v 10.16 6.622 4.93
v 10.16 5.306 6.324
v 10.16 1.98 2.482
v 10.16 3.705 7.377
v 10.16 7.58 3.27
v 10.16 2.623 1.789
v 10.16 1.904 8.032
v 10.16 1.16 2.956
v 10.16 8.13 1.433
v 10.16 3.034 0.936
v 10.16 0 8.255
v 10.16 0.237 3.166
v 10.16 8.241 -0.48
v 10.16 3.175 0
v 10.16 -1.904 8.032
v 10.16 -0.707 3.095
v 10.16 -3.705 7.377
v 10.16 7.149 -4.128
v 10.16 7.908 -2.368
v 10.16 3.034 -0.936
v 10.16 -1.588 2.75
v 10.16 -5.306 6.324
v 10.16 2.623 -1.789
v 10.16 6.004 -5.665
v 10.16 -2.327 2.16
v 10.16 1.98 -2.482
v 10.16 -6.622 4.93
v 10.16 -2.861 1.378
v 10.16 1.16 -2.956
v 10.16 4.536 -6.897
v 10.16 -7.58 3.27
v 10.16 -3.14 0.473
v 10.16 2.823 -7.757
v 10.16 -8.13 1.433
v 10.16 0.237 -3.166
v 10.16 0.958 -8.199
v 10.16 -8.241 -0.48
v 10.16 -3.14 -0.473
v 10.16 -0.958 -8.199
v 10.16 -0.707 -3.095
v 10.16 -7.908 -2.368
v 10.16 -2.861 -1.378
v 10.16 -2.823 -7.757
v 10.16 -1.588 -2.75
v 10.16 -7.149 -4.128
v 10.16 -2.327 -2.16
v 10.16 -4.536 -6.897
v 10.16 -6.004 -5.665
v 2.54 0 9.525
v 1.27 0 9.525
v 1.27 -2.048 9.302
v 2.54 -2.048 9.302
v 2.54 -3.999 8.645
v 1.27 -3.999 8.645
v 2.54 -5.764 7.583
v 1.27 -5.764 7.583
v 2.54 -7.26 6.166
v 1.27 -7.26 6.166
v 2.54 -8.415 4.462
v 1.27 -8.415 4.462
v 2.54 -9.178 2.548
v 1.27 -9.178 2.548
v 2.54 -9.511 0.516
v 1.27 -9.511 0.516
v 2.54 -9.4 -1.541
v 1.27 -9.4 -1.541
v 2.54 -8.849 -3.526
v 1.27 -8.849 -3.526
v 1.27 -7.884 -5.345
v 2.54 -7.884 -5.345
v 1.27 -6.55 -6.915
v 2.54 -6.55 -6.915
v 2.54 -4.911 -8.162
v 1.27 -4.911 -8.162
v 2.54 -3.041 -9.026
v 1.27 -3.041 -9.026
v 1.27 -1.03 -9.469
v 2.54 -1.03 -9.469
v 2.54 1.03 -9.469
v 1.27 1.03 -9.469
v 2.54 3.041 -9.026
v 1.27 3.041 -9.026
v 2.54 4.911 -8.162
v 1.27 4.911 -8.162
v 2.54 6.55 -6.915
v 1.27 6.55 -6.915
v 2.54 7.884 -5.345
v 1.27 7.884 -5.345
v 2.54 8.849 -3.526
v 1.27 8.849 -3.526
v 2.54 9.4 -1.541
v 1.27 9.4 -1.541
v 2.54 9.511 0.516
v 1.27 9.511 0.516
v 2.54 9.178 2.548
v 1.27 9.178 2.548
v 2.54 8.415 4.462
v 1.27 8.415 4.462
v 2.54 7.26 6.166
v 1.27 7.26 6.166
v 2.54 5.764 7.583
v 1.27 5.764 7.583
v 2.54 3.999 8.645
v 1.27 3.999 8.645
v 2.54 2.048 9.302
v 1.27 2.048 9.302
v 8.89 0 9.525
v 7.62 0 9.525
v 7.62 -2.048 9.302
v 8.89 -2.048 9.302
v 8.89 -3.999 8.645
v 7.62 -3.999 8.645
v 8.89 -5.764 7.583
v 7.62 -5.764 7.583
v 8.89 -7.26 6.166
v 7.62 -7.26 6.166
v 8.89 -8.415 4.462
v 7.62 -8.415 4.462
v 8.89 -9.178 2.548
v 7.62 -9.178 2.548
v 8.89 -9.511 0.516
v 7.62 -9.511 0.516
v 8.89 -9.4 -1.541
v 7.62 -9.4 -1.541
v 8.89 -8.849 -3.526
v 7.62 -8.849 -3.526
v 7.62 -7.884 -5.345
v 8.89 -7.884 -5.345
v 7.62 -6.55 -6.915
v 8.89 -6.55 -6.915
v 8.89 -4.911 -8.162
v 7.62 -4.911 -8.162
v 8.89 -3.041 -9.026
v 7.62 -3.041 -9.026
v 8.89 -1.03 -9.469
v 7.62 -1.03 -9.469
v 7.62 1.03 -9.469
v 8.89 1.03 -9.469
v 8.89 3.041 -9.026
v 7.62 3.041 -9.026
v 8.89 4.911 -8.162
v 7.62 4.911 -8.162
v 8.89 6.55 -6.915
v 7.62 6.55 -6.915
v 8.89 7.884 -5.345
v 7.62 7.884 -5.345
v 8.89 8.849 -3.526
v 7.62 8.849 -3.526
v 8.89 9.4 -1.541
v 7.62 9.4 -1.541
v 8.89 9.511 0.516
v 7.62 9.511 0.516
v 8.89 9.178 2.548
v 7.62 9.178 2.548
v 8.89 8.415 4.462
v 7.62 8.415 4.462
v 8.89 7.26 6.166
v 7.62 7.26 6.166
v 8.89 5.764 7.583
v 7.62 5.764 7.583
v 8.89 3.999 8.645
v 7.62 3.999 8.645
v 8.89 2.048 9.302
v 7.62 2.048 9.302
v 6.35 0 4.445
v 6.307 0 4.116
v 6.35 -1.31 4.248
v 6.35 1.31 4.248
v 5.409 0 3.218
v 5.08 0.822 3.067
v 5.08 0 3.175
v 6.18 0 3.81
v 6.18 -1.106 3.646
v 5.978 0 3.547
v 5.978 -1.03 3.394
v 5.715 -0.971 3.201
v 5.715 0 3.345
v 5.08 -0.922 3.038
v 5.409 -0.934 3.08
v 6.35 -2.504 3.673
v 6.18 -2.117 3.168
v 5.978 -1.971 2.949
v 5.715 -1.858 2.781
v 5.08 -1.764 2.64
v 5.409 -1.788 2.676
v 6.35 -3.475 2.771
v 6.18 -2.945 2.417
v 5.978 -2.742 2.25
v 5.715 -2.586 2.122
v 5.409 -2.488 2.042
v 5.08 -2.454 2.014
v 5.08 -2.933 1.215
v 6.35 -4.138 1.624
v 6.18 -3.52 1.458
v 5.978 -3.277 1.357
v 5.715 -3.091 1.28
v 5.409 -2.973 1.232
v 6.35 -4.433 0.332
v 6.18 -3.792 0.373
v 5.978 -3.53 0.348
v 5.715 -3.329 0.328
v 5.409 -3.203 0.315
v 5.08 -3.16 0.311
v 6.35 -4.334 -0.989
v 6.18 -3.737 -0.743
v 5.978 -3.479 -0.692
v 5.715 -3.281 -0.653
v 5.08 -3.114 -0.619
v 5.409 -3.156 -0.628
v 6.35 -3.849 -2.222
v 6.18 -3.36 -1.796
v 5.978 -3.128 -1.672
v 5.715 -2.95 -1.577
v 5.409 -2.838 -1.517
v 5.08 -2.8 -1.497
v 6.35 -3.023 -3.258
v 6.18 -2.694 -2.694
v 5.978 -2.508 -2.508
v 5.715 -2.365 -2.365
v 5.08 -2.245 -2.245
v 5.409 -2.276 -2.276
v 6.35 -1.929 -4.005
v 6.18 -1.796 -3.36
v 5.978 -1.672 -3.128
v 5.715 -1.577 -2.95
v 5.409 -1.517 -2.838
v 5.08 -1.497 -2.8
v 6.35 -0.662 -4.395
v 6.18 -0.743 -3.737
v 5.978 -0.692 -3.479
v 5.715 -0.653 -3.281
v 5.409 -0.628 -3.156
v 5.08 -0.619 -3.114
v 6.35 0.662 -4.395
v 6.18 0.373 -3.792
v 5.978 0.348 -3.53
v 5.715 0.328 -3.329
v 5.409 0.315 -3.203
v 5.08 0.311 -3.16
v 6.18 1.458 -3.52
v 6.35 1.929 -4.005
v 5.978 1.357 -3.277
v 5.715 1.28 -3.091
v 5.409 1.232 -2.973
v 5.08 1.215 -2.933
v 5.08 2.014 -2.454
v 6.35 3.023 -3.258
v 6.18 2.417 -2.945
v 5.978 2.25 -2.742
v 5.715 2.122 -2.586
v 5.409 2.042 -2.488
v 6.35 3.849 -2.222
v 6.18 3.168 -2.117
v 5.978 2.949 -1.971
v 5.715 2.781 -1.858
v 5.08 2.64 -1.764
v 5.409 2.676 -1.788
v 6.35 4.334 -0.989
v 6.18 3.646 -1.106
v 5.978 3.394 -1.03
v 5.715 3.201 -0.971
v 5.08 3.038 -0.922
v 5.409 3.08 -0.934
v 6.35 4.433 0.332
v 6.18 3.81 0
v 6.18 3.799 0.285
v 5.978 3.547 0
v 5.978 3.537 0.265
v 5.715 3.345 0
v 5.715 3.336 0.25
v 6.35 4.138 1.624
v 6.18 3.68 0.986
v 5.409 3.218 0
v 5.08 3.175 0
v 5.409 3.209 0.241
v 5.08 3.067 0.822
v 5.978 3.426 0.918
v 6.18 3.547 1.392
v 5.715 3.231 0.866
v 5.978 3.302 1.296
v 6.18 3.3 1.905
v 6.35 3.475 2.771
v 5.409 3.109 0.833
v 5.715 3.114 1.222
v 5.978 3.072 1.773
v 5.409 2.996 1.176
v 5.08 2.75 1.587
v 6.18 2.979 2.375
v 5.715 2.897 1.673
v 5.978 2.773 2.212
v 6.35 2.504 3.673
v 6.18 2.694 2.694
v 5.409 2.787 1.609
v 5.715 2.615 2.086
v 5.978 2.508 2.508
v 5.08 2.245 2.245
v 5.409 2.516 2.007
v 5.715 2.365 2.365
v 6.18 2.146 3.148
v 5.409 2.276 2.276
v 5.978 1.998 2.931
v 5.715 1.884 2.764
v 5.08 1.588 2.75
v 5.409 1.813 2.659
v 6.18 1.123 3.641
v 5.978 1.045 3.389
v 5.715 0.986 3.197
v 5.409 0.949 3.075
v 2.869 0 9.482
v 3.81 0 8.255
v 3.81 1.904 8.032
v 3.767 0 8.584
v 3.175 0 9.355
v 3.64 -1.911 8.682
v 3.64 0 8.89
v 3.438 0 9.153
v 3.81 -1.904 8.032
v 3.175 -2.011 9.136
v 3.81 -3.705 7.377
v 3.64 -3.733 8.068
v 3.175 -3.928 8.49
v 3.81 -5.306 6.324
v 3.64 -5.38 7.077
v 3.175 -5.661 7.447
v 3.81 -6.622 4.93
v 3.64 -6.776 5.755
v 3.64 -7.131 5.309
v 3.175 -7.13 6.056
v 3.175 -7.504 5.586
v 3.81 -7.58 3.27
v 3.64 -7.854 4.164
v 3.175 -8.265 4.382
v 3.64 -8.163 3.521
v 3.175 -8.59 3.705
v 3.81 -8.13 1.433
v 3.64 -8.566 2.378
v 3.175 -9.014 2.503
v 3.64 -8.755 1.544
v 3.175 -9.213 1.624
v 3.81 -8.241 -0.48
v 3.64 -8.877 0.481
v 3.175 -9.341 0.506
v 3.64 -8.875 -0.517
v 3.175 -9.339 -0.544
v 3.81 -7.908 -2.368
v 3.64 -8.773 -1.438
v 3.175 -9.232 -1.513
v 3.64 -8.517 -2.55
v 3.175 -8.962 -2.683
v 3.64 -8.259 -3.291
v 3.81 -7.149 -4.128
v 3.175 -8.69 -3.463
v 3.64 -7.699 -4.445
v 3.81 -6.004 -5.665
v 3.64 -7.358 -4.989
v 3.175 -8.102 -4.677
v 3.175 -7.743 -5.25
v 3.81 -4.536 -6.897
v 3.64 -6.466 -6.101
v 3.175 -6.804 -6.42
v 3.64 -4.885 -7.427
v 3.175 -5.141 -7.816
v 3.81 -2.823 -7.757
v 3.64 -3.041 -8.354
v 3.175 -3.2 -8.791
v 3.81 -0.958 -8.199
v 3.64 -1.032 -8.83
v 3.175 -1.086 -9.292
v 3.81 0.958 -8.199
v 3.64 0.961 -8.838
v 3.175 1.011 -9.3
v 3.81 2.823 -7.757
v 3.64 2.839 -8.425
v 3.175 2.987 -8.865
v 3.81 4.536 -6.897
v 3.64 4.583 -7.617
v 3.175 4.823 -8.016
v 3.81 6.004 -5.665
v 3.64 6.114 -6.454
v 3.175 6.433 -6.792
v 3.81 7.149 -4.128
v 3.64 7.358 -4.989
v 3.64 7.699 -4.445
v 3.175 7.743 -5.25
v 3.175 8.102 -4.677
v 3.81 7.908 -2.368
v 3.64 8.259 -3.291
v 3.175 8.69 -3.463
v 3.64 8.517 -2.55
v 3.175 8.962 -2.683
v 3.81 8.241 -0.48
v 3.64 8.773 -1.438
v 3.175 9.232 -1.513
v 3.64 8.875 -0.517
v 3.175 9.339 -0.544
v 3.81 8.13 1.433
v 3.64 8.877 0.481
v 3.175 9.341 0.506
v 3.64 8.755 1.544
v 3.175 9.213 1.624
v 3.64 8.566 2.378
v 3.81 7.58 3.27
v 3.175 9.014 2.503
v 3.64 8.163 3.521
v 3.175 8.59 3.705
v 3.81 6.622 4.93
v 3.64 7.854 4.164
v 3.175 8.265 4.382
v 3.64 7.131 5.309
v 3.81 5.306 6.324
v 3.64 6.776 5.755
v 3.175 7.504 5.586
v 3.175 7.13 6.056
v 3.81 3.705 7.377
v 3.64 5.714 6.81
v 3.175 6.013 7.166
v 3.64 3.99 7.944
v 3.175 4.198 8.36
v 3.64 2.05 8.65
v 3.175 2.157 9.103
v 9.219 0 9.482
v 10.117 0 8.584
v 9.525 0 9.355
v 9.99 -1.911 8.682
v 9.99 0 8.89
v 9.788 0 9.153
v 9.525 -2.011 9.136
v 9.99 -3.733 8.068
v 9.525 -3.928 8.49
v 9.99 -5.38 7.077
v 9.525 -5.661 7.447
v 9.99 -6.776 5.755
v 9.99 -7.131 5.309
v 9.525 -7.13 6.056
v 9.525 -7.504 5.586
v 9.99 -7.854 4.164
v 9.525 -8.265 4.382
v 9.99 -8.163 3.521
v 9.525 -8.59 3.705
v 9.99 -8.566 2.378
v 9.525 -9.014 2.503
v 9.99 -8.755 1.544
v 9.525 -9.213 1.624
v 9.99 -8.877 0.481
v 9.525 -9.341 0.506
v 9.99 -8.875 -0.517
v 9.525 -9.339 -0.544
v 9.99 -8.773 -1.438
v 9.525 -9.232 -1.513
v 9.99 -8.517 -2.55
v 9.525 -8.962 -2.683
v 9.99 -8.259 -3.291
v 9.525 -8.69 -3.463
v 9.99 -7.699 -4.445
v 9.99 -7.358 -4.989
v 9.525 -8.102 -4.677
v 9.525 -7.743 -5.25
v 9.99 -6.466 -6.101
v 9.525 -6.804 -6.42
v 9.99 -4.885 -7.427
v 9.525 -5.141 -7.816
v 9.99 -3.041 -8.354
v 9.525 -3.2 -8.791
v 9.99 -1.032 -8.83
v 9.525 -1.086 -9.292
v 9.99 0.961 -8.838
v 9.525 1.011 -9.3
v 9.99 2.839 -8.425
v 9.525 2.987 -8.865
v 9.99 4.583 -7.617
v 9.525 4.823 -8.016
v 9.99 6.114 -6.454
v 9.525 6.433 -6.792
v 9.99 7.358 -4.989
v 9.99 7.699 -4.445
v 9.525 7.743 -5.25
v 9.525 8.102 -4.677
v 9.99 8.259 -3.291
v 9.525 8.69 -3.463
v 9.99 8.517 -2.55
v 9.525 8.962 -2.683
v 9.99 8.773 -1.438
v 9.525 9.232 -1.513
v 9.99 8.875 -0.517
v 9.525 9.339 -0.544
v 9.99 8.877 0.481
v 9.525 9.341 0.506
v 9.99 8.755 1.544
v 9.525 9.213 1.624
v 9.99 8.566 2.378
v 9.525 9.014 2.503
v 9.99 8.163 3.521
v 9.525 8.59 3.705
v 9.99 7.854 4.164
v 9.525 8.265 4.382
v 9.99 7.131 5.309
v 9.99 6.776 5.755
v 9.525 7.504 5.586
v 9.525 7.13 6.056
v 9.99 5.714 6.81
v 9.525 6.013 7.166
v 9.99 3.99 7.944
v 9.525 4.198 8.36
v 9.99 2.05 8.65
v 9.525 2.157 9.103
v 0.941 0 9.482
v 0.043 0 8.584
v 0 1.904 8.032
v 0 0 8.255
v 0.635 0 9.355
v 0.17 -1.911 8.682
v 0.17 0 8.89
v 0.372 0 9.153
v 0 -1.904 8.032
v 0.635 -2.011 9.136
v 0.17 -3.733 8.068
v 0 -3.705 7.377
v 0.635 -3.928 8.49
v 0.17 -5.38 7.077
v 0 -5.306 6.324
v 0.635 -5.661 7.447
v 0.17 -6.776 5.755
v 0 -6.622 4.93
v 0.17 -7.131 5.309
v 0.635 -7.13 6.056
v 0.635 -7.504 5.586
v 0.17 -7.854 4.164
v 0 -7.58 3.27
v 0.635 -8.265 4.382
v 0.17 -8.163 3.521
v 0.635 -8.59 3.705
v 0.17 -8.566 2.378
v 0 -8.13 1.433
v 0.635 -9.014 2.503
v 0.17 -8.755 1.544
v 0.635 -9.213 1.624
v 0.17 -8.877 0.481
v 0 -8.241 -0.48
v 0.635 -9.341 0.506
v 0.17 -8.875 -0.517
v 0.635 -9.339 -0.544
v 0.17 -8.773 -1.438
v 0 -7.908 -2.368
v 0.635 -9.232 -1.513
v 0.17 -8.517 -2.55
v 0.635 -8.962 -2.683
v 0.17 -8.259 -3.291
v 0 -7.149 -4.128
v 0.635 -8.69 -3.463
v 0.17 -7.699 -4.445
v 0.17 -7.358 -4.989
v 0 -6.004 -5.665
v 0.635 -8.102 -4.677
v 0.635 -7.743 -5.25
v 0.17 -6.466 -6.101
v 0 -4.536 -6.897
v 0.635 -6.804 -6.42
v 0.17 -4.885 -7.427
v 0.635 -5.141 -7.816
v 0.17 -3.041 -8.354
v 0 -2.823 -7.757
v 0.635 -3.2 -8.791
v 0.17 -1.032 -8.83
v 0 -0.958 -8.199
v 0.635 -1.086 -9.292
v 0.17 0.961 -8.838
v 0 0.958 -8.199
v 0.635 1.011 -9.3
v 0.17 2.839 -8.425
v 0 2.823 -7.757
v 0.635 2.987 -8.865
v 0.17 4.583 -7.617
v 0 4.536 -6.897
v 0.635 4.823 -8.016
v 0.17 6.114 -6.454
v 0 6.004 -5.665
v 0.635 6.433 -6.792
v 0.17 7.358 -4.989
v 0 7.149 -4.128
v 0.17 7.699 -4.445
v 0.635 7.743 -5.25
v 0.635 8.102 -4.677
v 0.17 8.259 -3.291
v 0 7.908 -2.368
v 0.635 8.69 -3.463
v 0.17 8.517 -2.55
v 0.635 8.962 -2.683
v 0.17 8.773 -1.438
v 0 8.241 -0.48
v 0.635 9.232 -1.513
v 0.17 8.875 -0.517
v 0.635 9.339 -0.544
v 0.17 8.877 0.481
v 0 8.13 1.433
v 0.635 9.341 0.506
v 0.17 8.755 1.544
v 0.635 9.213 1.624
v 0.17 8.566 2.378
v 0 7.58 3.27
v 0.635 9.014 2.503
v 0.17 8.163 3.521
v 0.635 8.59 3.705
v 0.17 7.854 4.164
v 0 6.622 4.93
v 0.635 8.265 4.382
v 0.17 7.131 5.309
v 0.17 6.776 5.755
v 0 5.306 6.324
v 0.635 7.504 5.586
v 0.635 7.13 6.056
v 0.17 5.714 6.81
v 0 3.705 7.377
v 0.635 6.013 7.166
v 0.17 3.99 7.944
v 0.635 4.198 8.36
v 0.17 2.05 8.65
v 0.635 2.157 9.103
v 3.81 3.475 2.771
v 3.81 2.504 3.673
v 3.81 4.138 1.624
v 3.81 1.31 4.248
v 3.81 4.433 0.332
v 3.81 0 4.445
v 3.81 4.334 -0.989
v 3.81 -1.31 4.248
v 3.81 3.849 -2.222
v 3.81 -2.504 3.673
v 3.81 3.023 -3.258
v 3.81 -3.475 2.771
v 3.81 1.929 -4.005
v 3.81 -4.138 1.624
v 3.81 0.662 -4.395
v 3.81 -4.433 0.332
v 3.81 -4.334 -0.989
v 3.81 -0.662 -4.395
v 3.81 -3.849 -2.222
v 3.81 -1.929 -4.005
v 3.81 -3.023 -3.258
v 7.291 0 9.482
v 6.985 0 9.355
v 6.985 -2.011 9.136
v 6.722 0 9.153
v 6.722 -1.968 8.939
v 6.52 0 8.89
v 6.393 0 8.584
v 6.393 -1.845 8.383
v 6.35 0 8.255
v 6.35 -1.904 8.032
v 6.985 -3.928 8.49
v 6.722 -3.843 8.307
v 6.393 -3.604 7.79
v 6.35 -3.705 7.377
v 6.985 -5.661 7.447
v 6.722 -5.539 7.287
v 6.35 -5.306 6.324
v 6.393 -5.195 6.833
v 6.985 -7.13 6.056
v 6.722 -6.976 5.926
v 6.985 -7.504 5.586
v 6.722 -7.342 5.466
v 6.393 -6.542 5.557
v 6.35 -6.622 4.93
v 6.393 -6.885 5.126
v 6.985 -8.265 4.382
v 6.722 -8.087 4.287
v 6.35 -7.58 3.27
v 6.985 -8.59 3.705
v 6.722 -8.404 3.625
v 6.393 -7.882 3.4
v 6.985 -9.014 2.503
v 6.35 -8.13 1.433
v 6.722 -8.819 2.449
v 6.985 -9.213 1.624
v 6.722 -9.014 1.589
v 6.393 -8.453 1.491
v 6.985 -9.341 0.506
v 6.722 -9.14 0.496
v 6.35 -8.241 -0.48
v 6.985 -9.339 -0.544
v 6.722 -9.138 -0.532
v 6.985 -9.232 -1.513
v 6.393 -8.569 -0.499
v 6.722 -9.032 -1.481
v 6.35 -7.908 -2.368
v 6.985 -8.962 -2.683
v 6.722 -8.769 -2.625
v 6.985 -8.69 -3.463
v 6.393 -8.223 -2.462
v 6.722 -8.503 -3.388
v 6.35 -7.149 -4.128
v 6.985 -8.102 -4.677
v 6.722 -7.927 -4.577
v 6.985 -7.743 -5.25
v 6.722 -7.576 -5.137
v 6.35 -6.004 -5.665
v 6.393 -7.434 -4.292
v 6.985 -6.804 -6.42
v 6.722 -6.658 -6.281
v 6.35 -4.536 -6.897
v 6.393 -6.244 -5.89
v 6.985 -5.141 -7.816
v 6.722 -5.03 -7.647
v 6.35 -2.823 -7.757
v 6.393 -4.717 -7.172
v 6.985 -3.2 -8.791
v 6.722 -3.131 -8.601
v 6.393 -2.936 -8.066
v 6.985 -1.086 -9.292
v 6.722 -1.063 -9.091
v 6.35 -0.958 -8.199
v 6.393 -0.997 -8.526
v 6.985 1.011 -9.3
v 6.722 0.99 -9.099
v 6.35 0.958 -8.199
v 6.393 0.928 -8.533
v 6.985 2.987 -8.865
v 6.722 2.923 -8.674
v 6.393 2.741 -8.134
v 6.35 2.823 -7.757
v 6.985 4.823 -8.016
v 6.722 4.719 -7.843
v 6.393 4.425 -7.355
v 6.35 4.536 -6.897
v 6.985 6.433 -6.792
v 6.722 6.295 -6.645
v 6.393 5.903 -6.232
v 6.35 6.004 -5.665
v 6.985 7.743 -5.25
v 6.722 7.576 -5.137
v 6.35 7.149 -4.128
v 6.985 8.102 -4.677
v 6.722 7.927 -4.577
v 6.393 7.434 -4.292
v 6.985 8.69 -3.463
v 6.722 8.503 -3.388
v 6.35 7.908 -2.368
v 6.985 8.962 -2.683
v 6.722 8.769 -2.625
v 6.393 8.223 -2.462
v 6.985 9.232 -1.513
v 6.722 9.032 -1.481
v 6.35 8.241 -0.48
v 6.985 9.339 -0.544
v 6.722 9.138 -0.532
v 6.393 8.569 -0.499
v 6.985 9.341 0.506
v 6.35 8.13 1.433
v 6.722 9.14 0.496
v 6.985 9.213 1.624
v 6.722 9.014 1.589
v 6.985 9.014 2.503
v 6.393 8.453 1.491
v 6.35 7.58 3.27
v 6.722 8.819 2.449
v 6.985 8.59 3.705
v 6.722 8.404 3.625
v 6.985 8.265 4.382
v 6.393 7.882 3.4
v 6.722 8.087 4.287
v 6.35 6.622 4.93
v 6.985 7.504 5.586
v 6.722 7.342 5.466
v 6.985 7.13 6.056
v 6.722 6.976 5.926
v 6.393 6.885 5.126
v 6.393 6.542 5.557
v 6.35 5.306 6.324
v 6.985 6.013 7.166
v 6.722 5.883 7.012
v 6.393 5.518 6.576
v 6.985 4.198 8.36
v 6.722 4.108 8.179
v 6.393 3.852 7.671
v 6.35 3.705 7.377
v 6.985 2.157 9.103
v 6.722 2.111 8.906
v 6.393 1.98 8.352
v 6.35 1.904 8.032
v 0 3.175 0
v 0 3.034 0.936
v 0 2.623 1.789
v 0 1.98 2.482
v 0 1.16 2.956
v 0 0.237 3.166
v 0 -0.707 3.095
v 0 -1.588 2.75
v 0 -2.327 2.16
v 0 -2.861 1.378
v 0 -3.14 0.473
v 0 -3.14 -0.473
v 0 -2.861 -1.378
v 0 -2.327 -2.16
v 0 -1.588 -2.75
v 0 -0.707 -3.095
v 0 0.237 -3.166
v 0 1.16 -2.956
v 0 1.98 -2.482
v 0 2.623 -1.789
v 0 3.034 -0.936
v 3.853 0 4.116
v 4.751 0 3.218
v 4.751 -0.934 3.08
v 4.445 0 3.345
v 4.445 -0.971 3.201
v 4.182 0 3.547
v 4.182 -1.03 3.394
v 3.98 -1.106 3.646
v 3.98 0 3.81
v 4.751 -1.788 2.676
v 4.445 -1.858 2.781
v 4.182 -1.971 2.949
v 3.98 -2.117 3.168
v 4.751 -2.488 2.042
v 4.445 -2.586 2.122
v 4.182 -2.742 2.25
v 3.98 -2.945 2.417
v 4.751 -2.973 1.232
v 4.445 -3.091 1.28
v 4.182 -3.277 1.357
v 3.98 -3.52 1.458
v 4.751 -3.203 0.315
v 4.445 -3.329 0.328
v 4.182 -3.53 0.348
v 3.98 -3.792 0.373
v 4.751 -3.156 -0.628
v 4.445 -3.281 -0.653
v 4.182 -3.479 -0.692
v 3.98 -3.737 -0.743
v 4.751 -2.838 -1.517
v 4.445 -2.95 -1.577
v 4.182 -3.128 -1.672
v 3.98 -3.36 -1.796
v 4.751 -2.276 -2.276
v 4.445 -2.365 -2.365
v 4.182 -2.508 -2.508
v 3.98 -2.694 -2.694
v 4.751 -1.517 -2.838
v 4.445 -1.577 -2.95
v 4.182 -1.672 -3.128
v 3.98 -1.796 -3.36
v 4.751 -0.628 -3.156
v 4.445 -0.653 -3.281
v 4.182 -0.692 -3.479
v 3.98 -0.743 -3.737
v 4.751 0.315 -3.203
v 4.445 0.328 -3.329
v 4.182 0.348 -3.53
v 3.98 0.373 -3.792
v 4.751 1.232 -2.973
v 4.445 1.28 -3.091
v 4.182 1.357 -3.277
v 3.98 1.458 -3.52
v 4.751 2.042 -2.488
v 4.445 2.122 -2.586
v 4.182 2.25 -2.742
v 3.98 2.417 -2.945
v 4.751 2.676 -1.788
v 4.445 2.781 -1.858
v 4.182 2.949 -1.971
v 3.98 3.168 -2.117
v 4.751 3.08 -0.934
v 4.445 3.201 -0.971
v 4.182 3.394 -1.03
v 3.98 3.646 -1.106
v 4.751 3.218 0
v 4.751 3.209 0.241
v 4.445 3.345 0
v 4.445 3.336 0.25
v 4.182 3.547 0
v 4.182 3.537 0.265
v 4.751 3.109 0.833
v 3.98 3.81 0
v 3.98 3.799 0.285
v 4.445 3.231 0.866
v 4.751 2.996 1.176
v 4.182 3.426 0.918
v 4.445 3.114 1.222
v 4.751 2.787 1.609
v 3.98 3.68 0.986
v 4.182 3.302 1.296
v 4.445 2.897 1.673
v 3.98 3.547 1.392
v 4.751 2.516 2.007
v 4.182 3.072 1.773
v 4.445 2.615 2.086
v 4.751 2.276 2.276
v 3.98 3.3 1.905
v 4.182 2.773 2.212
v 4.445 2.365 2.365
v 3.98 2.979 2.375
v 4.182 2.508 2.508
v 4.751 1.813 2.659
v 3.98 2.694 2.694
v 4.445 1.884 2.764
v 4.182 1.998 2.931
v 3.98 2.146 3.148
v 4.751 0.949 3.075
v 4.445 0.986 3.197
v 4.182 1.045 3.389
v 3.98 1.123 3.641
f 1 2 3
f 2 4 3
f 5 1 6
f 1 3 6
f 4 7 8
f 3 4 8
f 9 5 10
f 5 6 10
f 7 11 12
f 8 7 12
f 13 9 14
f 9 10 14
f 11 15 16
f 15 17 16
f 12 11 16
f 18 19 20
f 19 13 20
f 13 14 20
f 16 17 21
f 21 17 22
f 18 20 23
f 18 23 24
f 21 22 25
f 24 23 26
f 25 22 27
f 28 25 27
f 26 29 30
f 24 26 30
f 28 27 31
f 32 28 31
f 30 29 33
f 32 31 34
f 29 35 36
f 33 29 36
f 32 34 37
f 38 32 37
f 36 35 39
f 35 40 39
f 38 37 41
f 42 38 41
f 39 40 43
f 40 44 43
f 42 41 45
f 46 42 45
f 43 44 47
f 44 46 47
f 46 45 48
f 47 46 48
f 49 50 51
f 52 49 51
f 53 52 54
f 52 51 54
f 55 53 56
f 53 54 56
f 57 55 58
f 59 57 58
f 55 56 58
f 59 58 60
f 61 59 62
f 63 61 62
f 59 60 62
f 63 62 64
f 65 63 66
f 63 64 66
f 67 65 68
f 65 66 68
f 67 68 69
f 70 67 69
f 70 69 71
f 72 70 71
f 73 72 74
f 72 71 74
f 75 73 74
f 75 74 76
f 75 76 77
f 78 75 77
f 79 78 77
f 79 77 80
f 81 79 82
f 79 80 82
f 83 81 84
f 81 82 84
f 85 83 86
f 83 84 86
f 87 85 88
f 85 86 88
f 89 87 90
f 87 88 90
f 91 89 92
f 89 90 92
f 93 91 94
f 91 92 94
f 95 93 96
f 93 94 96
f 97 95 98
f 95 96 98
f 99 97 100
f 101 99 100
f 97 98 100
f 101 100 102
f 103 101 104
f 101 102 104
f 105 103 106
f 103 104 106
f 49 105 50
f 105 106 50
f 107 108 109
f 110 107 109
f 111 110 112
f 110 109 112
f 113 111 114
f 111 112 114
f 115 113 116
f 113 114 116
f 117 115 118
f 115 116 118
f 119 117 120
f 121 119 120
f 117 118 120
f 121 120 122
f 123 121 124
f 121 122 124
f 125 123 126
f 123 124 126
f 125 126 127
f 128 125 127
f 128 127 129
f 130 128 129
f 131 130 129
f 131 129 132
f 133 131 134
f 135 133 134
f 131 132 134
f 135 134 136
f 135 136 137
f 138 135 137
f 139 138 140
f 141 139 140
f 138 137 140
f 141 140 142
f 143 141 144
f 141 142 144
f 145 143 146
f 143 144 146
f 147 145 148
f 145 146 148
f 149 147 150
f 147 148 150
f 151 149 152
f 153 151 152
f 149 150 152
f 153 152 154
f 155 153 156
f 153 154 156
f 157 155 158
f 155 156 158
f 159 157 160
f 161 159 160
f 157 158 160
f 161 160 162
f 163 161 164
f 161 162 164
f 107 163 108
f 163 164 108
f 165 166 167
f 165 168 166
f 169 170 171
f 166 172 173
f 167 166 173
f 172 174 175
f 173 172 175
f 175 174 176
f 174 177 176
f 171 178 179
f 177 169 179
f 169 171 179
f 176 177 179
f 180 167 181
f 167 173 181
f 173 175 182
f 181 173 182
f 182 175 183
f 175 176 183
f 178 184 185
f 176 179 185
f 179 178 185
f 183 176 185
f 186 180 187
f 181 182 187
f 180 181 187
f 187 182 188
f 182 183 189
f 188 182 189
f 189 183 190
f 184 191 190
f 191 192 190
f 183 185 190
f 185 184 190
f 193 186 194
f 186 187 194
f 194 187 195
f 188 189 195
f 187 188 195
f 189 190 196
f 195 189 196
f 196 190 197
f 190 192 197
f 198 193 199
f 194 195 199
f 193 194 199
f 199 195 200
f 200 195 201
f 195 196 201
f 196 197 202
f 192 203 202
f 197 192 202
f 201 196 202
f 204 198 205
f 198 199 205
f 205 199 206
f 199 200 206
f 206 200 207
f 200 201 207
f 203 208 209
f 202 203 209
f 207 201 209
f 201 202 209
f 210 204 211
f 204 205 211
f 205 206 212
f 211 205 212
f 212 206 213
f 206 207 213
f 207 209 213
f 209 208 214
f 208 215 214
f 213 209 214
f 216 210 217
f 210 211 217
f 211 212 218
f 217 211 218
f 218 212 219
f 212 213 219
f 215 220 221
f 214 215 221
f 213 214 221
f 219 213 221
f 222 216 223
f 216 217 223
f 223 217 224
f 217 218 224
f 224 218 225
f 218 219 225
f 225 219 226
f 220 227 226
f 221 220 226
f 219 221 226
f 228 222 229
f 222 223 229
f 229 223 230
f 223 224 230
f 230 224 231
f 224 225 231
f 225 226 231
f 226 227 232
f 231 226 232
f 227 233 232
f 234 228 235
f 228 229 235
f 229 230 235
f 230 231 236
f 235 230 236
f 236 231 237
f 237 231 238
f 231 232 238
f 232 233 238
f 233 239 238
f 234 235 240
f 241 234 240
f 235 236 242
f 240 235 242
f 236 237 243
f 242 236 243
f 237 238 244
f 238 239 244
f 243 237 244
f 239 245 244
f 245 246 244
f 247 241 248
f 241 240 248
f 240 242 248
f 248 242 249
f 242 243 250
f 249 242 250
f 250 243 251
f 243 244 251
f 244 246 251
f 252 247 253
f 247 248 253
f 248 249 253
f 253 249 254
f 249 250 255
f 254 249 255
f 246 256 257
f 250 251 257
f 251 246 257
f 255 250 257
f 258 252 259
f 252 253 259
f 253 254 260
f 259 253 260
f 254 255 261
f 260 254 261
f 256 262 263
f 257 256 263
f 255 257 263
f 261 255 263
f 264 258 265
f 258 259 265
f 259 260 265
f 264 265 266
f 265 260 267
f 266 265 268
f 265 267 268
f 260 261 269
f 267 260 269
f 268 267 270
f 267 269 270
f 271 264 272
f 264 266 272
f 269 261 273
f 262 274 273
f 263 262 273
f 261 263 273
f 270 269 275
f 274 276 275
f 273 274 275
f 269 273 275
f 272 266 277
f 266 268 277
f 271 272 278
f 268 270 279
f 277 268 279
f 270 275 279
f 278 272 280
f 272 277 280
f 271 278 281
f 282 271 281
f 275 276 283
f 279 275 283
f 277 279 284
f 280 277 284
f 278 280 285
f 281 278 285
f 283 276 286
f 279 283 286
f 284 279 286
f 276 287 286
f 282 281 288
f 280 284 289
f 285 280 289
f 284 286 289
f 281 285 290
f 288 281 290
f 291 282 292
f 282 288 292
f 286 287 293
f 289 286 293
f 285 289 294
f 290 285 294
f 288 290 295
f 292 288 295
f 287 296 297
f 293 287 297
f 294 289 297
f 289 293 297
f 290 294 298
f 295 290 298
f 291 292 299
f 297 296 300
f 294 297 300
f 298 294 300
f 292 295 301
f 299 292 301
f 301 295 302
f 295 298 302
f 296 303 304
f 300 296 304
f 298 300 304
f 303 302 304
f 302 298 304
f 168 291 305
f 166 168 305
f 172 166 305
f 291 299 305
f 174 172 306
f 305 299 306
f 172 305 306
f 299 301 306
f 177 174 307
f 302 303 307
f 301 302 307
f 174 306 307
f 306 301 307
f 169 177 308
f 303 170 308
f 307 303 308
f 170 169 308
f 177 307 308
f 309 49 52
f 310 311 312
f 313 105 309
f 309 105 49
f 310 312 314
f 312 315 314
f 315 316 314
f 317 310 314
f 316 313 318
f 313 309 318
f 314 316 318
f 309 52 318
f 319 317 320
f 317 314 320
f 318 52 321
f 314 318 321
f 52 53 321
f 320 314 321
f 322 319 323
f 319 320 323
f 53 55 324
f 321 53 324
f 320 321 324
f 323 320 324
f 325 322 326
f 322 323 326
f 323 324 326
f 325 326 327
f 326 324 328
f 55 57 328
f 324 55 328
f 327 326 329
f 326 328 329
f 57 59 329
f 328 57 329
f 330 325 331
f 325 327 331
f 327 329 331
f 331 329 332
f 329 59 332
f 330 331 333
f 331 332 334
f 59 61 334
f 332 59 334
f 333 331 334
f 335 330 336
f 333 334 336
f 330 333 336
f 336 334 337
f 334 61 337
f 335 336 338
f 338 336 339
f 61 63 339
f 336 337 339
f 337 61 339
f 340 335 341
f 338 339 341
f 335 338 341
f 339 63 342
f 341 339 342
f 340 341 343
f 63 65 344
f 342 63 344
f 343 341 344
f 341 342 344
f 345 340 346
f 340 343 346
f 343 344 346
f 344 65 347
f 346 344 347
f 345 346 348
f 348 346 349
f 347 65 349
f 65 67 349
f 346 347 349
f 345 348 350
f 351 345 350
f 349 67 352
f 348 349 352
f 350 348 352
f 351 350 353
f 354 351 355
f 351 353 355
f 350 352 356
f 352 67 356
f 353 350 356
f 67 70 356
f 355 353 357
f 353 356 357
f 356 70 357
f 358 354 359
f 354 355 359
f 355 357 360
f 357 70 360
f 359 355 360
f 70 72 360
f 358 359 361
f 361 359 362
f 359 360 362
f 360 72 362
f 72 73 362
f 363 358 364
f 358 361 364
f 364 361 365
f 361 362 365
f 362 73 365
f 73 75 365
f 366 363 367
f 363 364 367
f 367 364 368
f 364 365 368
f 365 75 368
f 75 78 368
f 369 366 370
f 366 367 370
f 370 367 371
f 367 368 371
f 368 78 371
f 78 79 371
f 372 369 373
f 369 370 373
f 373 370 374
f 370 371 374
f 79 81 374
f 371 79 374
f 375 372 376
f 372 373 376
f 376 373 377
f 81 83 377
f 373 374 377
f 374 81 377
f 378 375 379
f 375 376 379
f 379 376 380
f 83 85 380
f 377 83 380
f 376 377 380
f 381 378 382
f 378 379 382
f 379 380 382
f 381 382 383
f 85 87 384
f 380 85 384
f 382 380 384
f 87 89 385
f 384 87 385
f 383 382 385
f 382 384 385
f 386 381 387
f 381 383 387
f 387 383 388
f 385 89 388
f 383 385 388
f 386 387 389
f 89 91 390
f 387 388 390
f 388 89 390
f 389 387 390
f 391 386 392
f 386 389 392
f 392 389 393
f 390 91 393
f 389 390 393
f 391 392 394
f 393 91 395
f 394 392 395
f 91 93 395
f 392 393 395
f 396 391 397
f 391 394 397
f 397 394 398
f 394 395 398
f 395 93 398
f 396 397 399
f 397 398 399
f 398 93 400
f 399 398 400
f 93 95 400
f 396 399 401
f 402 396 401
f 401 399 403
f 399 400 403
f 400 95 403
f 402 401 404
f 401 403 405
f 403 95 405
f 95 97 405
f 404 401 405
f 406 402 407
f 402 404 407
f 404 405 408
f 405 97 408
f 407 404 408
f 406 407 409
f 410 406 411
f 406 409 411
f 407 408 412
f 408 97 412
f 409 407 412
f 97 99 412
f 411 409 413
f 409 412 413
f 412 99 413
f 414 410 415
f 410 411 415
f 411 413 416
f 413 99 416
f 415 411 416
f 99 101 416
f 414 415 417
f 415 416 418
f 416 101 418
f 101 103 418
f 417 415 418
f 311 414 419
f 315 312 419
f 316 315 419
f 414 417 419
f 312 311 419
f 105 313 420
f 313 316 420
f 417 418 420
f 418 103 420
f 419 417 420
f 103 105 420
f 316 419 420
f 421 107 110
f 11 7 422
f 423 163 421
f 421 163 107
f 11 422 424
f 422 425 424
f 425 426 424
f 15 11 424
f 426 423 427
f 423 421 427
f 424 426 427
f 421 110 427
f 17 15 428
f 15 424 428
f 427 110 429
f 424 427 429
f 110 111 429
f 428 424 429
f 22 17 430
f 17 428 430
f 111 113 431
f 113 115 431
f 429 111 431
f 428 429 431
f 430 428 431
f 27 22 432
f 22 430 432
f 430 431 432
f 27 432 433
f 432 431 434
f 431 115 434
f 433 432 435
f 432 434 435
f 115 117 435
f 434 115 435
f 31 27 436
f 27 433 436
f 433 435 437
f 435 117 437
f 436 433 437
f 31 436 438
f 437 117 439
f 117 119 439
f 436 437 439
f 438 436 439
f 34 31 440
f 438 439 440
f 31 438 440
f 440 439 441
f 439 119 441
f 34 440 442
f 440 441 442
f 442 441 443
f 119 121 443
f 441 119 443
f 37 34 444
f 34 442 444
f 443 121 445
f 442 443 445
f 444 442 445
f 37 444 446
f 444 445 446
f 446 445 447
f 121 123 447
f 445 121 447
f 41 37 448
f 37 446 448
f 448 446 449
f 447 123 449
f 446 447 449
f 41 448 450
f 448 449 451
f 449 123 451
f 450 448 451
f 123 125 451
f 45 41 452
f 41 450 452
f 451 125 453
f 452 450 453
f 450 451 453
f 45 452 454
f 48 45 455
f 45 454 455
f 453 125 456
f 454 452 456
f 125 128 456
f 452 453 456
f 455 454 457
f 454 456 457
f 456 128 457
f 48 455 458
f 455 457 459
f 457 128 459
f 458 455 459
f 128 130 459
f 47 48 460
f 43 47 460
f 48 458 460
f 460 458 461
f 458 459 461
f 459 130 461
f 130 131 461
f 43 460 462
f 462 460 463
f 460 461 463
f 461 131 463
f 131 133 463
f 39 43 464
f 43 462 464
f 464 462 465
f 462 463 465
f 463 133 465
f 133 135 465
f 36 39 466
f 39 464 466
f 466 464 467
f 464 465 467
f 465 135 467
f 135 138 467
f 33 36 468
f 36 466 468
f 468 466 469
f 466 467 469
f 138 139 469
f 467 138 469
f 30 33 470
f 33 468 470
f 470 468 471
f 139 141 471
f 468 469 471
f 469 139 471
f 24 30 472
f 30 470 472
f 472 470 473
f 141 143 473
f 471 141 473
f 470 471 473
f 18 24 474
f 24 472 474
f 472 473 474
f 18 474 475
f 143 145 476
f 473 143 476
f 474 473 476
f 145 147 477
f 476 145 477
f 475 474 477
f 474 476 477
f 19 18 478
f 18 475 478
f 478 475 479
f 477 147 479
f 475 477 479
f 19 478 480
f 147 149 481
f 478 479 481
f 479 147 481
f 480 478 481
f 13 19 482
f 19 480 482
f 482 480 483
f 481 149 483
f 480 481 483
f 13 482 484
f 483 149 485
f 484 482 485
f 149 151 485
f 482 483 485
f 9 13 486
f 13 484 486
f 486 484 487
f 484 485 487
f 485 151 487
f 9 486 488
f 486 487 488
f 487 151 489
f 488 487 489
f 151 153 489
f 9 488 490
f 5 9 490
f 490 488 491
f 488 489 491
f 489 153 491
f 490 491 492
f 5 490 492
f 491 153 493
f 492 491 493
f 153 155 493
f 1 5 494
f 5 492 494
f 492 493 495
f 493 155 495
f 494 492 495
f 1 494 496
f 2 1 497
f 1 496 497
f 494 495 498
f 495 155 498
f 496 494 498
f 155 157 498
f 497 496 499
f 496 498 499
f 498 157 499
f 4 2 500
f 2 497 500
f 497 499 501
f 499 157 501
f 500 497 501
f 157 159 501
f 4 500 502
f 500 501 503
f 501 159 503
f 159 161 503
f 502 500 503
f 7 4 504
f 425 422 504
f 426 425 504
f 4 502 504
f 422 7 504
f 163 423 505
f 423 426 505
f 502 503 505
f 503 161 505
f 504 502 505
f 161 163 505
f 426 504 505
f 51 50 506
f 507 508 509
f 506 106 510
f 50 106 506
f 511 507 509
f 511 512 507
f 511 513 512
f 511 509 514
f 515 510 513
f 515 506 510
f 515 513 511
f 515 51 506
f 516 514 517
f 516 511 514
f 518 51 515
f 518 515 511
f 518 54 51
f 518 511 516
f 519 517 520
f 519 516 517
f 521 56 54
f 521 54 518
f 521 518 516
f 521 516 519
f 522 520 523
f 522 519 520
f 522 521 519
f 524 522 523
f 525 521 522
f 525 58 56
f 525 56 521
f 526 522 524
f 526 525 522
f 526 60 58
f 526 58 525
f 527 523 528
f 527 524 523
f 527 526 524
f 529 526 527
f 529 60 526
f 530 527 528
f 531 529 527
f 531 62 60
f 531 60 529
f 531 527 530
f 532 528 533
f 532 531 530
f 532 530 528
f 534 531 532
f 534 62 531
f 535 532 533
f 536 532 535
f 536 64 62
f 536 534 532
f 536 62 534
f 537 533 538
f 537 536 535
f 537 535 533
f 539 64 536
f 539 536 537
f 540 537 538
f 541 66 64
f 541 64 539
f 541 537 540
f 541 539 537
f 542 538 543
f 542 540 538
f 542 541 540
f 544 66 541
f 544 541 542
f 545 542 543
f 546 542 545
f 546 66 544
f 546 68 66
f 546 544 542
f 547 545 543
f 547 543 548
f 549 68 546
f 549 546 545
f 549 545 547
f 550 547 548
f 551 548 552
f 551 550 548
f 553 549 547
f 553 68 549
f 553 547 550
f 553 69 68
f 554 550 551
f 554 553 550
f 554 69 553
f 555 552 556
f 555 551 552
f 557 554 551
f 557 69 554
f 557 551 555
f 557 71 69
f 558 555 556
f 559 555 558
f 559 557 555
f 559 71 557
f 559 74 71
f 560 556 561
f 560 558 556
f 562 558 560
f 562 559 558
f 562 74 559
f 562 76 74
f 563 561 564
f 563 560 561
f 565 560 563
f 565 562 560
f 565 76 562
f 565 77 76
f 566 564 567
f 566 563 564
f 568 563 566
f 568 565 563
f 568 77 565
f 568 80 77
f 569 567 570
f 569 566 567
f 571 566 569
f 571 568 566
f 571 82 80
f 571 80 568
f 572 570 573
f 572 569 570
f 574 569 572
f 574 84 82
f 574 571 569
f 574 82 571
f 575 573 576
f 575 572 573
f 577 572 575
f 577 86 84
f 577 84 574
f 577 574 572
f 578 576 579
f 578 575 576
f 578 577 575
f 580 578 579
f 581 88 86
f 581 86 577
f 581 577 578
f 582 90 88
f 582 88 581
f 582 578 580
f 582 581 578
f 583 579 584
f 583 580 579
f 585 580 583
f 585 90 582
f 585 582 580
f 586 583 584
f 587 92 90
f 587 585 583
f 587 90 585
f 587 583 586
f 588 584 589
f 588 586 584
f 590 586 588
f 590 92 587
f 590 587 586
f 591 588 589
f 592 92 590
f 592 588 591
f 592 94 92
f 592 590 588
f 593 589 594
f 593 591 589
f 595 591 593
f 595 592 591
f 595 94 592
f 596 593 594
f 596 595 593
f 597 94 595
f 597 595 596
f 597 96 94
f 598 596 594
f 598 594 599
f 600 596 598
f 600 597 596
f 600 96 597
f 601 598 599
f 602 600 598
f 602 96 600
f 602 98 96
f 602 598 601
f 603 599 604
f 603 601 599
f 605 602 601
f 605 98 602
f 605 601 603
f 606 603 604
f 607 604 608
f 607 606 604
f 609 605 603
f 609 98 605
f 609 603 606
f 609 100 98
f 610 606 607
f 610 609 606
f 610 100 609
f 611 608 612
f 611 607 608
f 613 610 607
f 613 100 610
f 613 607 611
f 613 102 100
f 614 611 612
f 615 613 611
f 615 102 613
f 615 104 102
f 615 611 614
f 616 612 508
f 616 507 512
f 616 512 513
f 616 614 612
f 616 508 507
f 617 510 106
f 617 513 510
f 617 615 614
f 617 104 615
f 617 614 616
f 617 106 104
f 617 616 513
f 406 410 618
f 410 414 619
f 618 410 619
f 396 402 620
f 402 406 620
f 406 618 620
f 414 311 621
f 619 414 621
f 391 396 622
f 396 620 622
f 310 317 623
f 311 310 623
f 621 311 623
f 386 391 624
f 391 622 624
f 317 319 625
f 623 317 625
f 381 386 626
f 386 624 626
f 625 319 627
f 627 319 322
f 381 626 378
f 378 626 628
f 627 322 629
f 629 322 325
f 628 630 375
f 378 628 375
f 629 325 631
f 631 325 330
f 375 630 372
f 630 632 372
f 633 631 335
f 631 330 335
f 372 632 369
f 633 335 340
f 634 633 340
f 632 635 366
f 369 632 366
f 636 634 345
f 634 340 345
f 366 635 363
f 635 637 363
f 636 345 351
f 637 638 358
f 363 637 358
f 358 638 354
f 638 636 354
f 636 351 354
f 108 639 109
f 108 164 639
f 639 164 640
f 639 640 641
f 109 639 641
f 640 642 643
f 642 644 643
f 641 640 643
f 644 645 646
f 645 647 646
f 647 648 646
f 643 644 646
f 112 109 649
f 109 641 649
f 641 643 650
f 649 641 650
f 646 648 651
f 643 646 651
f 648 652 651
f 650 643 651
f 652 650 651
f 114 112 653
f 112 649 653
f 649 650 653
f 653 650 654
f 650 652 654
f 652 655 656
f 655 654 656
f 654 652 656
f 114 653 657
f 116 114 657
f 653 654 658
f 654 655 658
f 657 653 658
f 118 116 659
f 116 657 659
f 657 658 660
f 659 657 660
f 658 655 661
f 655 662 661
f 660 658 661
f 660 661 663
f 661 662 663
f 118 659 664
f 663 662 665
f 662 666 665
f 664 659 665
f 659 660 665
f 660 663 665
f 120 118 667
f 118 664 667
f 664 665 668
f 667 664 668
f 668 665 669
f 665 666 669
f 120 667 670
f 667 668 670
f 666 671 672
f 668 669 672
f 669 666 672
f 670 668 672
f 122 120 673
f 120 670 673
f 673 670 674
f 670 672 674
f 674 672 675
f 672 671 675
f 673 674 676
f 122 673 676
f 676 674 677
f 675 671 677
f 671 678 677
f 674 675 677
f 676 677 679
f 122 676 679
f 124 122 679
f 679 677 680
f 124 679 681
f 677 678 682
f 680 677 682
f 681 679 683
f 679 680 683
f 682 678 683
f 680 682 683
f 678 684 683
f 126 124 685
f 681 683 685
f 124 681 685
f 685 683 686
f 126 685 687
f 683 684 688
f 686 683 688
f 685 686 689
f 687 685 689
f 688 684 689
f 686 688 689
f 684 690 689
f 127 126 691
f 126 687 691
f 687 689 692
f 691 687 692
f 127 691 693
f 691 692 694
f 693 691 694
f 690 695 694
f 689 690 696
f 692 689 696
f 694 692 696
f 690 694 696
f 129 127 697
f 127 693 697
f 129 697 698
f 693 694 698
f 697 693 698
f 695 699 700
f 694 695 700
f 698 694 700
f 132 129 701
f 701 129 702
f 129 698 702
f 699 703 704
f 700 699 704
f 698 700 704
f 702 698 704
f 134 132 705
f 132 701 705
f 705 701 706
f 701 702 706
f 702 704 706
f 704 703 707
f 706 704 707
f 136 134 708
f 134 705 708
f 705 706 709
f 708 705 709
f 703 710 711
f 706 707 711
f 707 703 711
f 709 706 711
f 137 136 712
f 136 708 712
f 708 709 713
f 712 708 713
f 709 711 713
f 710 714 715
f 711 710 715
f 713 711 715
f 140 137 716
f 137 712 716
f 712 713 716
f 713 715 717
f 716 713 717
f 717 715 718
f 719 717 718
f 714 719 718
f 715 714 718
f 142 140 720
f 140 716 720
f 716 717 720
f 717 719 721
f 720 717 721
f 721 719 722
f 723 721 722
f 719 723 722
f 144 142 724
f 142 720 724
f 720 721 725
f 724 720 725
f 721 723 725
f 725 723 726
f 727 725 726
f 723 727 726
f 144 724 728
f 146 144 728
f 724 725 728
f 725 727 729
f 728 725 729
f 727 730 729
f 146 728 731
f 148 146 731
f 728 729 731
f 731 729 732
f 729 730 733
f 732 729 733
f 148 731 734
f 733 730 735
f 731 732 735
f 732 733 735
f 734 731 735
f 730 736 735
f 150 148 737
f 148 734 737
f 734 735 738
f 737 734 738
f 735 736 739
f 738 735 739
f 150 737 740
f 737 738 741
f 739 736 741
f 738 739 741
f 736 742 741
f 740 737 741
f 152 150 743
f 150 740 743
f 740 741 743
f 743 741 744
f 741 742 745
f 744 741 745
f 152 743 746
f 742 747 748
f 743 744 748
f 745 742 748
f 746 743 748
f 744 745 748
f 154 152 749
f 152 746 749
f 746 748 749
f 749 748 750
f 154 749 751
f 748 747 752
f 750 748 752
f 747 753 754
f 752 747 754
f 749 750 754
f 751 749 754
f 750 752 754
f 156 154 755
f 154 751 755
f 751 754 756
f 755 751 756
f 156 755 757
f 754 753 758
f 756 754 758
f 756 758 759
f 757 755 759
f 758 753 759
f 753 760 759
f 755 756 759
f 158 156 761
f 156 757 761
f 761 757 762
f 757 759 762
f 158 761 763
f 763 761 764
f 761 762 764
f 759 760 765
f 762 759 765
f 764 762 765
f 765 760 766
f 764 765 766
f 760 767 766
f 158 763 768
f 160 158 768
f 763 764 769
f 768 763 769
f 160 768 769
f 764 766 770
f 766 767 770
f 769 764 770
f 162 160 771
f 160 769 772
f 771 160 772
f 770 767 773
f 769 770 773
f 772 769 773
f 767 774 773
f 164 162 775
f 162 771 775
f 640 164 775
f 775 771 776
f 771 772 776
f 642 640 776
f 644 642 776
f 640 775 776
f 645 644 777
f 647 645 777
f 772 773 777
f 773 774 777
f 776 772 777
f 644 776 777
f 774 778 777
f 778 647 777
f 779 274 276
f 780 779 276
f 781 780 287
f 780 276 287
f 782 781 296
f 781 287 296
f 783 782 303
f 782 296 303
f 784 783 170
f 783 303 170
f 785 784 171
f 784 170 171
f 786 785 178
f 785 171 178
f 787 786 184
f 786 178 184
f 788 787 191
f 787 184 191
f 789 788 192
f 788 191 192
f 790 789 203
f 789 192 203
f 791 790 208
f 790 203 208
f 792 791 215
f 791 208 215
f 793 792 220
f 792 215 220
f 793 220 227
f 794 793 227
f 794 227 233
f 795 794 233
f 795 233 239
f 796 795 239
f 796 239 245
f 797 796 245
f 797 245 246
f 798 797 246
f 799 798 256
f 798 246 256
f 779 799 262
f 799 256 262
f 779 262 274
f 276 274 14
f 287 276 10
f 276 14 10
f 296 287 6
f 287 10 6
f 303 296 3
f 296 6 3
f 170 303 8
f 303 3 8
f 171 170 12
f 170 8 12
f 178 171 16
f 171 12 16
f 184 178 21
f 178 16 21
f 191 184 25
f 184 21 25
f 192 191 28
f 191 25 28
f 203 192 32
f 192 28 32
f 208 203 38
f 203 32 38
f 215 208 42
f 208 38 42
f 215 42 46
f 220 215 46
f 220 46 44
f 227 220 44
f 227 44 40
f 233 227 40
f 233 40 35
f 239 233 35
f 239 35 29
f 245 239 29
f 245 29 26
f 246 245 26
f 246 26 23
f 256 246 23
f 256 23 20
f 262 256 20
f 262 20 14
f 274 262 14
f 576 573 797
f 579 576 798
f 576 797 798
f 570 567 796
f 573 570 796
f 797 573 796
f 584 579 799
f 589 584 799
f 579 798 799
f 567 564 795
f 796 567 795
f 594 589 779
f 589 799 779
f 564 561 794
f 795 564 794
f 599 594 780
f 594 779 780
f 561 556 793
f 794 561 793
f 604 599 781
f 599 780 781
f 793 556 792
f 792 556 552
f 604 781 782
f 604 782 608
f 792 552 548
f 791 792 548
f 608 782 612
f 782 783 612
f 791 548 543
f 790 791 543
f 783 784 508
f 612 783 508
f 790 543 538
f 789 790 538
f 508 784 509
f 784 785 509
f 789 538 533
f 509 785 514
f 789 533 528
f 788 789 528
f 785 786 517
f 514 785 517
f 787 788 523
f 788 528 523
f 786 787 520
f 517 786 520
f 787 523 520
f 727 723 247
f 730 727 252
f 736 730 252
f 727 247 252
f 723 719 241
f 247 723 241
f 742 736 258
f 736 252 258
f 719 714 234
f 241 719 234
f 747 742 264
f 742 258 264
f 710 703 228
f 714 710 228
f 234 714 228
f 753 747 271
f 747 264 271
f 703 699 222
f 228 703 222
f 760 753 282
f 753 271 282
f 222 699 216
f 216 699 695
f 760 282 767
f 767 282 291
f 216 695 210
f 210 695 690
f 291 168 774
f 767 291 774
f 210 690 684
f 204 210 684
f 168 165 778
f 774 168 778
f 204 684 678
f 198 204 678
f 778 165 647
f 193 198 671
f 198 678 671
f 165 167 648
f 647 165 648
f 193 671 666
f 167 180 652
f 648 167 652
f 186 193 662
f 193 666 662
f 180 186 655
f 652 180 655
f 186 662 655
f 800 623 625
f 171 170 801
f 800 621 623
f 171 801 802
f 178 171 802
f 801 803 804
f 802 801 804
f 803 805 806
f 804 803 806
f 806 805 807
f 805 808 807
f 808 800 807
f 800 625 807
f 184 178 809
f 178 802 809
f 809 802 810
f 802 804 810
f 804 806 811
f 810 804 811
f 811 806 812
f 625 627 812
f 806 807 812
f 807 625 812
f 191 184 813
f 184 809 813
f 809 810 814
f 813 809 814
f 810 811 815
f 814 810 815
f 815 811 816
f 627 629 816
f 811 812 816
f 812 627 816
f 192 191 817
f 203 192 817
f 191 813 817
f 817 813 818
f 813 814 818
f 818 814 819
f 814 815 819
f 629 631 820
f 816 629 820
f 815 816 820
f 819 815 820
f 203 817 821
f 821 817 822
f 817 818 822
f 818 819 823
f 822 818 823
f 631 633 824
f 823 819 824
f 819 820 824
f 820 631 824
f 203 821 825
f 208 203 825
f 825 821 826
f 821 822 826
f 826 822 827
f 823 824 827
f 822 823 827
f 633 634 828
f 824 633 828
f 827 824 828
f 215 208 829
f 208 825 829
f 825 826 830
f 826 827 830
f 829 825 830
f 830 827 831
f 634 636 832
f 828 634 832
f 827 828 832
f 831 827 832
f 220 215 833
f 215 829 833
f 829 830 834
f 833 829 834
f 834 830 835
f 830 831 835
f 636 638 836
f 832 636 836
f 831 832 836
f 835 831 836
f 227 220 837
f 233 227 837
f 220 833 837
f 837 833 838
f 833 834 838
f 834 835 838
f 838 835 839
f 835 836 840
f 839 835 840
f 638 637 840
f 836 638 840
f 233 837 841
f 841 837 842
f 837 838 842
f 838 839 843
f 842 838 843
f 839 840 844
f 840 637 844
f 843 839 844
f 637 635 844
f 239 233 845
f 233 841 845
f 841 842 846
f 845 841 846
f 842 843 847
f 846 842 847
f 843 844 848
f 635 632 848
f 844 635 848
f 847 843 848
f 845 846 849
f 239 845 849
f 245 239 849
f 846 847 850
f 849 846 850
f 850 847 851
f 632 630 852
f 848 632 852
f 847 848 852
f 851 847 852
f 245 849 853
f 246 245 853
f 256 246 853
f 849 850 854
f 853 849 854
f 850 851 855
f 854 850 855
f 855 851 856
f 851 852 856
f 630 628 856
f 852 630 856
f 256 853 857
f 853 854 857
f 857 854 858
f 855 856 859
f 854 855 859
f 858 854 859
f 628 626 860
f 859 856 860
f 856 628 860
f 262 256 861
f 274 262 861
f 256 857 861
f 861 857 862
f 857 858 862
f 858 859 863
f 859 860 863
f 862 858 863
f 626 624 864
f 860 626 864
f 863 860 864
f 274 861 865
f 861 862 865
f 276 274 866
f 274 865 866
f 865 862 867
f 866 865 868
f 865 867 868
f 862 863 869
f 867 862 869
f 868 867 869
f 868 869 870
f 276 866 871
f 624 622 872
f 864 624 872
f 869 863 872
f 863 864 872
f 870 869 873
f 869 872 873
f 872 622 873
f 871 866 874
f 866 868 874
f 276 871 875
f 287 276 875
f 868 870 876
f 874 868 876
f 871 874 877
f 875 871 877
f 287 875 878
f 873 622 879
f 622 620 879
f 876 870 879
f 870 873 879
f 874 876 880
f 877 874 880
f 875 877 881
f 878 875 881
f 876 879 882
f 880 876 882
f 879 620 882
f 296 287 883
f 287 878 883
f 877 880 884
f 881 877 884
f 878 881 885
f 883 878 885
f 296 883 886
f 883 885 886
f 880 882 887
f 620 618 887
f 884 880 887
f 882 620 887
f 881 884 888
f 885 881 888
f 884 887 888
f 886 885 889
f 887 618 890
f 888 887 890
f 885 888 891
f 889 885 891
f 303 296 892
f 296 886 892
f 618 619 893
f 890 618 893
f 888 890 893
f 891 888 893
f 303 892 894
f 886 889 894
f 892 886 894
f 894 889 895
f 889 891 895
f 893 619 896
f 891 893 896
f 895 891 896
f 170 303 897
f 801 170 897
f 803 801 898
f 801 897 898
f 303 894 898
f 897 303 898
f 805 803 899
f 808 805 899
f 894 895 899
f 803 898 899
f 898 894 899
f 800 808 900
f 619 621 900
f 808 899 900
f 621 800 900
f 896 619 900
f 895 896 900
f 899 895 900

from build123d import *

# Parameters (mm, degrees)
F2_R     = 1.26999
F3_R     = 3.175
F4_DEPTH = 25.4


# Not quite as in the source:
# - a fillet or chamfer is up to 0.001 mm smaller than in the source, because OpenCascade refuses the exact size


with BuildPart() as f1:
    # F0 (on Front) → F1 (revolve)
    with BuildSketch(Plane.XZ):
        Polygon((0, 9.525), (0, 0), (10.16, 0), (10.16, 9.525), (6.35, 9.525), (6.35, 3.175), (3.81, 3.175), (3.81, 9.525), align=None)
    revolve(axis=Axis((5.08, 0, 0), (1, 0, 0)))

    # F2 (radius 1.27 in the source; OpenCascade refuses exactly that, so slightly less here)
    f2_edges = [f1.edges().sort_by_distance(p)[0] for p in [
        (10.16, 0, -9.525),
        (6.35, 0, -9.525),
        (3.81, 0, -9.525),
        (0, 0, -9.525),
        (3.81, 0, -3.175),
        (6.35, 0, -3.175),
    ]]
    fillet(f2_edges, radius=F2_R)

    # F3 (on face) → F4 (cut)
    with BuildSketch(Plane.YZ.offset(10.16)):
        Circle(F3_R)
    extrude(amount=-F4_DEPTH, mode=Mode.SUBTRACT)


solid = f1.part
